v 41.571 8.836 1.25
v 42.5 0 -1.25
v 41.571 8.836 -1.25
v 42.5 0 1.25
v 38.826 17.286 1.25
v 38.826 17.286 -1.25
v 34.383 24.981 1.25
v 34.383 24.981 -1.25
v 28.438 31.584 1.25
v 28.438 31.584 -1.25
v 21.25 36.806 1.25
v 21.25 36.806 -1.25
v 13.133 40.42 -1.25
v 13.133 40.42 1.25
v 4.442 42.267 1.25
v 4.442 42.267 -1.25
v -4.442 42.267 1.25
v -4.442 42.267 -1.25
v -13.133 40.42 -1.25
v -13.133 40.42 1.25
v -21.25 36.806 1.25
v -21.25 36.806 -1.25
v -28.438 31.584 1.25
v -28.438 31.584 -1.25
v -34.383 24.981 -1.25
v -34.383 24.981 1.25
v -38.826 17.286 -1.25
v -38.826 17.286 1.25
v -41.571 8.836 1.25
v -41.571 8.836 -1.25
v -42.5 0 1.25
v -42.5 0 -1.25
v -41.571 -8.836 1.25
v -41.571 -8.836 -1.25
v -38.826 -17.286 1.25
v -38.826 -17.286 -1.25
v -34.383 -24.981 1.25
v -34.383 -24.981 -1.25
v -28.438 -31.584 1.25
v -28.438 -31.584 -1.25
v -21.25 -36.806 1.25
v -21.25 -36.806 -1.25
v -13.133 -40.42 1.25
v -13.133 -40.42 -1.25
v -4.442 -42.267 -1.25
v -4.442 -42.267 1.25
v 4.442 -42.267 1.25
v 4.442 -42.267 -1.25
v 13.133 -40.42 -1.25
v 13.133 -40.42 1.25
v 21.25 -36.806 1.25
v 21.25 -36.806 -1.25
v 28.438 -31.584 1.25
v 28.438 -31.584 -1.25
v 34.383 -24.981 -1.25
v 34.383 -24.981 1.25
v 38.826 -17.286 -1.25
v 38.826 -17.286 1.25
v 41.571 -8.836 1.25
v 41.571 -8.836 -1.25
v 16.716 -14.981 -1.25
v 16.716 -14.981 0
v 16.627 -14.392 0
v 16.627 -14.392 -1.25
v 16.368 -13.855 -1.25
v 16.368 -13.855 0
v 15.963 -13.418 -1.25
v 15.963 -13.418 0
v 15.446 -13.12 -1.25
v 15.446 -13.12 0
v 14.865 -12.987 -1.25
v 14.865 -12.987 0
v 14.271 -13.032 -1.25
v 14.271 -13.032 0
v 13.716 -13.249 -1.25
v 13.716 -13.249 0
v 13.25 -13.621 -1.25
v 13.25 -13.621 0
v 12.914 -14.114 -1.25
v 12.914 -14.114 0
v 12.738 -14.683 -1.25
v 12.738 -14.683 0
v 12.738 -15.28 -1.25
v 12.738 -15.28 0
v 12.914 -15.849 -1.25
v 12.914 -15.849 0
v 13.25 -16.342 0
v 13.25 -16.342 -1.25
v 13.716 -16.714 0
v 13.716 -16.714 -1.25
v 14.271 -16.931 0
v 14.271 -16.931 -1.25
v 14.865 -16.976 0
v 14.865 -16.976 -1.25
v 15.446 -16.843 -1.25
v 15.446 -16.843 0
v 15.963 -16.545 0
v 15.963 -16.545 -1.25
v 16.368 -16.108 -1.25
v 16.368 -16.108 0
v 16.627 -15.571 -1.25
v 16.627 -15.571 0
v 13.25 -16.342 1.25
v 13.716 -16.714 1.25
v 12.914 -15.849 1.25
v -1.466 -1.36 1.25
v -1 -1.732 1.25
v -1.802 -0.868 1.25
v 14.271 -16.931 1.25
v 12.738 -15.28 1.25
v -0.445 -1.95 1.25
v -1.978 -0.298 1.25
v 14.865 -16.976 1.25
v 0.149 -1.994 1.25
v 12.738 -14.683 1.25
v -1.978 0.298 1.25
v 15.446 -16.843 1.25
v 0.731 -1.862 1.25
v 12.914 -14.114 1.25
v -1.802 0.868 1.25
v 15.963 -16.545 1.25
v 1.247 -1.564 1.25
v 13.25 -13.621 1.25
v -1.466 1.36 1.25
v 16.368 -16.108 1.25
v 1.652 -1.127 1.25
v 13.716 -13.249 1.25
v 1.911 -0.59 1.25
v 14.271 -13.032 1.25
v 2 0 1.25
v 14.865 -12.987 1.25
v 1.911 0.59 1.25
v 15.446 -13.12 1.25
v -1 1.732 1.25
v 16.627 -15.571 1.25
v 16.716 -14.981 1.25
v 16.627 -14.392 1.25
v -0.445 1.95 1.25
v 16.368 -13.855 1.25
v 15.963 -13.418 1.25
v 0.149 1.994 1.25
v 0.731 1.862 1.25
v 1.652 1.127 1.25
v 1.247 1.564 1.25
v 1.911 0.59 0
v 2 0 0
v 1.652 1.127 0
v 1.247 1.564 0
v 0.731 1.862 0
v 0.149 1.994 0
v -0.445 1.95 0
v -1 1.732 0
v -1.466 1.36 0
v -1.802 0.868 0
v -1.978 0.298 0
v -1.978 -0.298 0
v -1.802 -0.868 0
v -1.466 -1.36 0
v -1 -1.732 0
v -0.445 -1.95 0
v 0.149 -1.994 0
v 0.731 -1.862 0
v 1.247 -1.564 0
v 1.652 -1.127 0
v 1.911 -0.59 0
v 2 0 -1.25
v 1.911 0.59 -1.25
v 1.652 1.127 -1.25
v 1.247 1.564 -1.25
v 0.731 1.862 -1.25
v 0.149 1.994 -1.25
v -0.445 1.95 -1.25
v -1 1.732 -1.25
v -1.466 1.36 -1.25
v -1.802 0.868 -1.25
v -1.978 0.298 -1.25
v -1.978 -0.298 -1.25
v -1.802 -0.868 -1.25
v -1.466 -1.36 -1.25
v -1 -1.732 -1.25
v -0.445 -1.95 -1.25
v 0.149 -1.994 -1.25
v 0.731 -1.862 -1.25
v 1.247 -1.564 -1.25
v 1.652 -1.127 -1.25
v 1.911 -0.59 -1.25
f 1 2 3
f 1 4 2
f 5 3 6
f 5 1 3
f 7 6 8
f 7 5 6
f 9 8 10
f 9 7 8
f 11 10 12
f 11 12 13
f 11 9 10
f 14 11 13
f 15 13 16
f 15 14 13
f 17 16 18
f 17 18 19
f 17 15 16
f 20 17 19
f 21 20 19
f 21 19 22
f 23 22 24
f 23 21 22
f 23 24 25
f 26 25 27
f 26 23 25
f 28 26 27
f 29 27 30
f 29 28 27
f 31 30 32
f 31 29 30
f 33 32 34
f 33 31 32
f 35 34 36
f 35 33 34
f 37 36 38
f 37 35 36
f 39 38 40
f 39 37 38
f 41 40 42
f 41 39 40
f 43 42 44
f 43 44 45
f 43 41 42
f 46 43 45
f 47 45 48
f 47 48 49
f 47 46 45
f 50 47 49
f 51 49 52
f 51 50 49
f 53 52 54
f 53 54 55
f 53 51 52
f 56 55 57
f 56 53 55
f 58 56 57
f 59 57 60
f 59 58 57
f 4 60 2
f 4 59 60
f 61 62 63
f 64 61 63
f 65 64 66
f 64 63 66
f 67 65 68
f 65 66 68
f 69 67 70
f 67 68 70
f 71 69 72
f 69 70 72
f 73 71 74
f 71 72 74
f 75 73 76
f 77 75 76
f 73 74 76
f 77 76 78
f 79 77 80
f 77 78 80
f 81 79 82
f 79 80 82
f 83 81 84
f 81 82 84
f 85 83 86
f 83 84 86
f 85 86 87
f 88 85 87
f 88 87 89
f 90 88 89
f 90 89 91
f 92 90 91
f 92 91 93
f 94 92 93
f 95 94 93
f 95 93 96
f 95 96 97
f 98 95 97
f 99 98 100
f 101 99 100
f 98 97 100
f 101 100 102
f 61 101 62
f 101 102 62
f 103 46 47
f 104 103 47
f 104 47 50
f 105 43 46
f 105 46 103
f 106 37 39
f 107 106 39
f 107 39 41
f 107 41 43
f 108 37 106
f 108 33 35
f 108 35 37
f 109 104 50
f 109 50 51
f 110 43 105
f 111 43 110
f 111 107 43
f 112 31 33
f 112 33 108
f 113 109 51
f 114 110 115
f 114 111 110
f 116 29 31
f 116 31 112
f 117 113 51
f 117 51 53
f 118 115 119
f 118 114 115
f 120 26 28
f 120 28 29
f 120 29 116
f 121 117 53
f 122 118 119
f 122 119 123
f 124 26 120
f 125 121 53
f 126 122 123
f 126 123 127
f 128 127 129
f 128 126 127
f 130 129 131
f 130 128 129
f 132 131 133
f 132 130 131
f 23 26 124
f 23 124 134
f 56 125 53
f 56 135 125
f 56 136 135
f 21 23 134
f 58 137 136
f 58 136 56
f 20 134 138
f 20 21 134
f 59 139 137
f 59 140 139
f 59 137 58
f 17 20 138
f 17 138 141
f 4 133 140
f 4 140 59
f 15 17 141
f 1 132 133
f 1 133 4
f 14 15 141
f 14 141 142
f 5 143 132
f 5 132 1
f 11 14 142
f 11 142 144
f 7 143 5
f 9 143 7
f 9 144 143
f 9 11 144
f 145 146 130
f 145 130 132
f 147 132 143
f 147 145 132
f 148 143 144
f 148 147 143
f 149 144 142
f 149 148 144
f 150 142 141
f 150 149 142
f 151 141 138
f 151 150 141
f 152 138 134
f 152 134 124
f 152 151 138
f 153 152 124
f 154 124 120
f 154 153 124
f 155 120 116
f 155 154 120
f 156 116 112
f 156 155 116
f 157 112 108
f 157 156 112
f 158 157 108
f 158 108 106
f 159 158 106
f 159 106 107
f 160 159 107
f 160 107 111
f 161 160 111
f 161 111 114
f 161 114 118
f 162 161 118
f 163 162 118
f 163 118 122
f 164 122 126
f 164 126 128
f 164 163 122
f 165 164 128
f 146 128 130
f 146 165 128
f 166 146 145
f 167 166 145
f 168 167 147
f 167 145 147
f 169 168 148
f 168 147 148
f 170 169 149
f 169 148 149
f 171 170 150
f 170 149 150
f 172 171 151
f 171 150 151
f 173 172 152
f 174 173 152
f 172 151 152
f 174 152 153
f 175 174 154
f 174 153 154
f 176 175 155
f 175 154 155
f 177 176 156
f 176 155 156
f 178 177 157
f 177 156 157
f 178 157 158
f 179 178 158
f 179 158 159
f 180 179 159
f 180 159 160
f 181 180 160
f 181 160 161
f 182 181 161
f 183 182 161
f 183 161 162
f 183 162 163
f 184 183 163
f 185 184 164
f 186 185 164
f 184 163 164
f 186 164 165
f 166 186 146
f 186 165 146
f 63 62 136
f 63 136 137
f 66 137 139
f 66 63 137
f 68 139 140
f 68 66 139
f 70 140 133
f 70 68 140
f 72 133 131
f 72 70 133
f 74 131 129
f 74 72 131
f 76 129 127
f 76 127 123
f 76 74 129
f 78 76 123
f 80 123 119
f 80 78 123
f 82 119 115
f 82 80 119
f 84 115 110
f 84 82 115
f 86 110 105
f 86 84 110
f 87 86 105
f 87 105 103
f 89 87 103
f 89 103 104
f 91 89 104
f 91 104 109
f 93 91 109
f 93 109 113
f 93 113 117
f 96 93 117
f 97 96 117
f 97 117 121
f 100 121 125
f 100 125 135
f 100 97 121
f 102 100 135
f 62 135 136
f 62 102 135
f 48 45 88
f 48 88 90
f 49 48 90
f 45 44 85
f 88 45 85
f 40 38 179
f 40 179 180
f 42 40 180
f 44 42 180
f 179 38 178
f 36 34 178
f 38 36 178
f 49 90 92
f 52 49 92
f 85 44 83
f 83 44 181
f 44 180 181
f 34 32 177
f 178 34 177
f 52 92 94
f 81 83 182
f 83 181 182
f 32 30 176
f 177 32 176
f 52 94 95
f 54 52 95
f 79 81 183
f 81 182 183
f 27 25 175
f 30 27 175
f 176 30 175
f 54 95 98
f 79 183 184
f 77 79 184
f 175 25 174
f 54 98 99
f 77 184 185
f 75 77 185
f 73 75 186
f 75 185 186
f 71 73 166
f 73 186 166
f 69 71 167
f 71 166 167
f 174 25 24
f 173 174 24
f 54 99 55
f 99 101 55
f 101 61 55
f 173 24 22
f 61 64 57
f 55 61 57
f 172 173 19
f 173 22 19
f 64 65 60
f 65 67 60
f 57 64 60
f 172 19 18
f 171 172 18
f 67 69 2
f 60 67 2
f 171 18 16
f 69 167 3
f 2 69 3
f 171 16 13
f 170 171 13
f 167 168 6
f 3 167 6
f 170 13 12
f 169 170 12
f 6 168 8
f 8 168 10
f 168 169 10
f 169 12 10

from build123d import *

# Parameters (mm, degrees)
BOSS_EXTRUDE1_DEPTH      = 1.25
BOSS_EXTRUDE1_DEPTH_BACK = 1.25
SKETCH1_R                = 42.5
SKETCH1_R_2              = 2


with BuildPart() as part:
    # Sketch1 → Boss-Extrude1 (new, two sides: drawn at the far end of the back side and taken through both)
    with BuildSketch(Plane.XY.offset(-BOSS_EXTRUDE1_DEPTH_BACK)):
        Circle(SKETCH1_R)
        with Locations((14.715815051, -14.981481481)):
            Circle(SKETCH1_R_2, mode=Mode.SUBTRACT)
        Circle(SKETCH1_R_2, mode=Mode.SUBTRACT)
    extrude(amount=BOSS_EXTRUDE1_DEPTH + BOSS_EXTRUDE1_DEPTH_BACK)


solid = part.part
